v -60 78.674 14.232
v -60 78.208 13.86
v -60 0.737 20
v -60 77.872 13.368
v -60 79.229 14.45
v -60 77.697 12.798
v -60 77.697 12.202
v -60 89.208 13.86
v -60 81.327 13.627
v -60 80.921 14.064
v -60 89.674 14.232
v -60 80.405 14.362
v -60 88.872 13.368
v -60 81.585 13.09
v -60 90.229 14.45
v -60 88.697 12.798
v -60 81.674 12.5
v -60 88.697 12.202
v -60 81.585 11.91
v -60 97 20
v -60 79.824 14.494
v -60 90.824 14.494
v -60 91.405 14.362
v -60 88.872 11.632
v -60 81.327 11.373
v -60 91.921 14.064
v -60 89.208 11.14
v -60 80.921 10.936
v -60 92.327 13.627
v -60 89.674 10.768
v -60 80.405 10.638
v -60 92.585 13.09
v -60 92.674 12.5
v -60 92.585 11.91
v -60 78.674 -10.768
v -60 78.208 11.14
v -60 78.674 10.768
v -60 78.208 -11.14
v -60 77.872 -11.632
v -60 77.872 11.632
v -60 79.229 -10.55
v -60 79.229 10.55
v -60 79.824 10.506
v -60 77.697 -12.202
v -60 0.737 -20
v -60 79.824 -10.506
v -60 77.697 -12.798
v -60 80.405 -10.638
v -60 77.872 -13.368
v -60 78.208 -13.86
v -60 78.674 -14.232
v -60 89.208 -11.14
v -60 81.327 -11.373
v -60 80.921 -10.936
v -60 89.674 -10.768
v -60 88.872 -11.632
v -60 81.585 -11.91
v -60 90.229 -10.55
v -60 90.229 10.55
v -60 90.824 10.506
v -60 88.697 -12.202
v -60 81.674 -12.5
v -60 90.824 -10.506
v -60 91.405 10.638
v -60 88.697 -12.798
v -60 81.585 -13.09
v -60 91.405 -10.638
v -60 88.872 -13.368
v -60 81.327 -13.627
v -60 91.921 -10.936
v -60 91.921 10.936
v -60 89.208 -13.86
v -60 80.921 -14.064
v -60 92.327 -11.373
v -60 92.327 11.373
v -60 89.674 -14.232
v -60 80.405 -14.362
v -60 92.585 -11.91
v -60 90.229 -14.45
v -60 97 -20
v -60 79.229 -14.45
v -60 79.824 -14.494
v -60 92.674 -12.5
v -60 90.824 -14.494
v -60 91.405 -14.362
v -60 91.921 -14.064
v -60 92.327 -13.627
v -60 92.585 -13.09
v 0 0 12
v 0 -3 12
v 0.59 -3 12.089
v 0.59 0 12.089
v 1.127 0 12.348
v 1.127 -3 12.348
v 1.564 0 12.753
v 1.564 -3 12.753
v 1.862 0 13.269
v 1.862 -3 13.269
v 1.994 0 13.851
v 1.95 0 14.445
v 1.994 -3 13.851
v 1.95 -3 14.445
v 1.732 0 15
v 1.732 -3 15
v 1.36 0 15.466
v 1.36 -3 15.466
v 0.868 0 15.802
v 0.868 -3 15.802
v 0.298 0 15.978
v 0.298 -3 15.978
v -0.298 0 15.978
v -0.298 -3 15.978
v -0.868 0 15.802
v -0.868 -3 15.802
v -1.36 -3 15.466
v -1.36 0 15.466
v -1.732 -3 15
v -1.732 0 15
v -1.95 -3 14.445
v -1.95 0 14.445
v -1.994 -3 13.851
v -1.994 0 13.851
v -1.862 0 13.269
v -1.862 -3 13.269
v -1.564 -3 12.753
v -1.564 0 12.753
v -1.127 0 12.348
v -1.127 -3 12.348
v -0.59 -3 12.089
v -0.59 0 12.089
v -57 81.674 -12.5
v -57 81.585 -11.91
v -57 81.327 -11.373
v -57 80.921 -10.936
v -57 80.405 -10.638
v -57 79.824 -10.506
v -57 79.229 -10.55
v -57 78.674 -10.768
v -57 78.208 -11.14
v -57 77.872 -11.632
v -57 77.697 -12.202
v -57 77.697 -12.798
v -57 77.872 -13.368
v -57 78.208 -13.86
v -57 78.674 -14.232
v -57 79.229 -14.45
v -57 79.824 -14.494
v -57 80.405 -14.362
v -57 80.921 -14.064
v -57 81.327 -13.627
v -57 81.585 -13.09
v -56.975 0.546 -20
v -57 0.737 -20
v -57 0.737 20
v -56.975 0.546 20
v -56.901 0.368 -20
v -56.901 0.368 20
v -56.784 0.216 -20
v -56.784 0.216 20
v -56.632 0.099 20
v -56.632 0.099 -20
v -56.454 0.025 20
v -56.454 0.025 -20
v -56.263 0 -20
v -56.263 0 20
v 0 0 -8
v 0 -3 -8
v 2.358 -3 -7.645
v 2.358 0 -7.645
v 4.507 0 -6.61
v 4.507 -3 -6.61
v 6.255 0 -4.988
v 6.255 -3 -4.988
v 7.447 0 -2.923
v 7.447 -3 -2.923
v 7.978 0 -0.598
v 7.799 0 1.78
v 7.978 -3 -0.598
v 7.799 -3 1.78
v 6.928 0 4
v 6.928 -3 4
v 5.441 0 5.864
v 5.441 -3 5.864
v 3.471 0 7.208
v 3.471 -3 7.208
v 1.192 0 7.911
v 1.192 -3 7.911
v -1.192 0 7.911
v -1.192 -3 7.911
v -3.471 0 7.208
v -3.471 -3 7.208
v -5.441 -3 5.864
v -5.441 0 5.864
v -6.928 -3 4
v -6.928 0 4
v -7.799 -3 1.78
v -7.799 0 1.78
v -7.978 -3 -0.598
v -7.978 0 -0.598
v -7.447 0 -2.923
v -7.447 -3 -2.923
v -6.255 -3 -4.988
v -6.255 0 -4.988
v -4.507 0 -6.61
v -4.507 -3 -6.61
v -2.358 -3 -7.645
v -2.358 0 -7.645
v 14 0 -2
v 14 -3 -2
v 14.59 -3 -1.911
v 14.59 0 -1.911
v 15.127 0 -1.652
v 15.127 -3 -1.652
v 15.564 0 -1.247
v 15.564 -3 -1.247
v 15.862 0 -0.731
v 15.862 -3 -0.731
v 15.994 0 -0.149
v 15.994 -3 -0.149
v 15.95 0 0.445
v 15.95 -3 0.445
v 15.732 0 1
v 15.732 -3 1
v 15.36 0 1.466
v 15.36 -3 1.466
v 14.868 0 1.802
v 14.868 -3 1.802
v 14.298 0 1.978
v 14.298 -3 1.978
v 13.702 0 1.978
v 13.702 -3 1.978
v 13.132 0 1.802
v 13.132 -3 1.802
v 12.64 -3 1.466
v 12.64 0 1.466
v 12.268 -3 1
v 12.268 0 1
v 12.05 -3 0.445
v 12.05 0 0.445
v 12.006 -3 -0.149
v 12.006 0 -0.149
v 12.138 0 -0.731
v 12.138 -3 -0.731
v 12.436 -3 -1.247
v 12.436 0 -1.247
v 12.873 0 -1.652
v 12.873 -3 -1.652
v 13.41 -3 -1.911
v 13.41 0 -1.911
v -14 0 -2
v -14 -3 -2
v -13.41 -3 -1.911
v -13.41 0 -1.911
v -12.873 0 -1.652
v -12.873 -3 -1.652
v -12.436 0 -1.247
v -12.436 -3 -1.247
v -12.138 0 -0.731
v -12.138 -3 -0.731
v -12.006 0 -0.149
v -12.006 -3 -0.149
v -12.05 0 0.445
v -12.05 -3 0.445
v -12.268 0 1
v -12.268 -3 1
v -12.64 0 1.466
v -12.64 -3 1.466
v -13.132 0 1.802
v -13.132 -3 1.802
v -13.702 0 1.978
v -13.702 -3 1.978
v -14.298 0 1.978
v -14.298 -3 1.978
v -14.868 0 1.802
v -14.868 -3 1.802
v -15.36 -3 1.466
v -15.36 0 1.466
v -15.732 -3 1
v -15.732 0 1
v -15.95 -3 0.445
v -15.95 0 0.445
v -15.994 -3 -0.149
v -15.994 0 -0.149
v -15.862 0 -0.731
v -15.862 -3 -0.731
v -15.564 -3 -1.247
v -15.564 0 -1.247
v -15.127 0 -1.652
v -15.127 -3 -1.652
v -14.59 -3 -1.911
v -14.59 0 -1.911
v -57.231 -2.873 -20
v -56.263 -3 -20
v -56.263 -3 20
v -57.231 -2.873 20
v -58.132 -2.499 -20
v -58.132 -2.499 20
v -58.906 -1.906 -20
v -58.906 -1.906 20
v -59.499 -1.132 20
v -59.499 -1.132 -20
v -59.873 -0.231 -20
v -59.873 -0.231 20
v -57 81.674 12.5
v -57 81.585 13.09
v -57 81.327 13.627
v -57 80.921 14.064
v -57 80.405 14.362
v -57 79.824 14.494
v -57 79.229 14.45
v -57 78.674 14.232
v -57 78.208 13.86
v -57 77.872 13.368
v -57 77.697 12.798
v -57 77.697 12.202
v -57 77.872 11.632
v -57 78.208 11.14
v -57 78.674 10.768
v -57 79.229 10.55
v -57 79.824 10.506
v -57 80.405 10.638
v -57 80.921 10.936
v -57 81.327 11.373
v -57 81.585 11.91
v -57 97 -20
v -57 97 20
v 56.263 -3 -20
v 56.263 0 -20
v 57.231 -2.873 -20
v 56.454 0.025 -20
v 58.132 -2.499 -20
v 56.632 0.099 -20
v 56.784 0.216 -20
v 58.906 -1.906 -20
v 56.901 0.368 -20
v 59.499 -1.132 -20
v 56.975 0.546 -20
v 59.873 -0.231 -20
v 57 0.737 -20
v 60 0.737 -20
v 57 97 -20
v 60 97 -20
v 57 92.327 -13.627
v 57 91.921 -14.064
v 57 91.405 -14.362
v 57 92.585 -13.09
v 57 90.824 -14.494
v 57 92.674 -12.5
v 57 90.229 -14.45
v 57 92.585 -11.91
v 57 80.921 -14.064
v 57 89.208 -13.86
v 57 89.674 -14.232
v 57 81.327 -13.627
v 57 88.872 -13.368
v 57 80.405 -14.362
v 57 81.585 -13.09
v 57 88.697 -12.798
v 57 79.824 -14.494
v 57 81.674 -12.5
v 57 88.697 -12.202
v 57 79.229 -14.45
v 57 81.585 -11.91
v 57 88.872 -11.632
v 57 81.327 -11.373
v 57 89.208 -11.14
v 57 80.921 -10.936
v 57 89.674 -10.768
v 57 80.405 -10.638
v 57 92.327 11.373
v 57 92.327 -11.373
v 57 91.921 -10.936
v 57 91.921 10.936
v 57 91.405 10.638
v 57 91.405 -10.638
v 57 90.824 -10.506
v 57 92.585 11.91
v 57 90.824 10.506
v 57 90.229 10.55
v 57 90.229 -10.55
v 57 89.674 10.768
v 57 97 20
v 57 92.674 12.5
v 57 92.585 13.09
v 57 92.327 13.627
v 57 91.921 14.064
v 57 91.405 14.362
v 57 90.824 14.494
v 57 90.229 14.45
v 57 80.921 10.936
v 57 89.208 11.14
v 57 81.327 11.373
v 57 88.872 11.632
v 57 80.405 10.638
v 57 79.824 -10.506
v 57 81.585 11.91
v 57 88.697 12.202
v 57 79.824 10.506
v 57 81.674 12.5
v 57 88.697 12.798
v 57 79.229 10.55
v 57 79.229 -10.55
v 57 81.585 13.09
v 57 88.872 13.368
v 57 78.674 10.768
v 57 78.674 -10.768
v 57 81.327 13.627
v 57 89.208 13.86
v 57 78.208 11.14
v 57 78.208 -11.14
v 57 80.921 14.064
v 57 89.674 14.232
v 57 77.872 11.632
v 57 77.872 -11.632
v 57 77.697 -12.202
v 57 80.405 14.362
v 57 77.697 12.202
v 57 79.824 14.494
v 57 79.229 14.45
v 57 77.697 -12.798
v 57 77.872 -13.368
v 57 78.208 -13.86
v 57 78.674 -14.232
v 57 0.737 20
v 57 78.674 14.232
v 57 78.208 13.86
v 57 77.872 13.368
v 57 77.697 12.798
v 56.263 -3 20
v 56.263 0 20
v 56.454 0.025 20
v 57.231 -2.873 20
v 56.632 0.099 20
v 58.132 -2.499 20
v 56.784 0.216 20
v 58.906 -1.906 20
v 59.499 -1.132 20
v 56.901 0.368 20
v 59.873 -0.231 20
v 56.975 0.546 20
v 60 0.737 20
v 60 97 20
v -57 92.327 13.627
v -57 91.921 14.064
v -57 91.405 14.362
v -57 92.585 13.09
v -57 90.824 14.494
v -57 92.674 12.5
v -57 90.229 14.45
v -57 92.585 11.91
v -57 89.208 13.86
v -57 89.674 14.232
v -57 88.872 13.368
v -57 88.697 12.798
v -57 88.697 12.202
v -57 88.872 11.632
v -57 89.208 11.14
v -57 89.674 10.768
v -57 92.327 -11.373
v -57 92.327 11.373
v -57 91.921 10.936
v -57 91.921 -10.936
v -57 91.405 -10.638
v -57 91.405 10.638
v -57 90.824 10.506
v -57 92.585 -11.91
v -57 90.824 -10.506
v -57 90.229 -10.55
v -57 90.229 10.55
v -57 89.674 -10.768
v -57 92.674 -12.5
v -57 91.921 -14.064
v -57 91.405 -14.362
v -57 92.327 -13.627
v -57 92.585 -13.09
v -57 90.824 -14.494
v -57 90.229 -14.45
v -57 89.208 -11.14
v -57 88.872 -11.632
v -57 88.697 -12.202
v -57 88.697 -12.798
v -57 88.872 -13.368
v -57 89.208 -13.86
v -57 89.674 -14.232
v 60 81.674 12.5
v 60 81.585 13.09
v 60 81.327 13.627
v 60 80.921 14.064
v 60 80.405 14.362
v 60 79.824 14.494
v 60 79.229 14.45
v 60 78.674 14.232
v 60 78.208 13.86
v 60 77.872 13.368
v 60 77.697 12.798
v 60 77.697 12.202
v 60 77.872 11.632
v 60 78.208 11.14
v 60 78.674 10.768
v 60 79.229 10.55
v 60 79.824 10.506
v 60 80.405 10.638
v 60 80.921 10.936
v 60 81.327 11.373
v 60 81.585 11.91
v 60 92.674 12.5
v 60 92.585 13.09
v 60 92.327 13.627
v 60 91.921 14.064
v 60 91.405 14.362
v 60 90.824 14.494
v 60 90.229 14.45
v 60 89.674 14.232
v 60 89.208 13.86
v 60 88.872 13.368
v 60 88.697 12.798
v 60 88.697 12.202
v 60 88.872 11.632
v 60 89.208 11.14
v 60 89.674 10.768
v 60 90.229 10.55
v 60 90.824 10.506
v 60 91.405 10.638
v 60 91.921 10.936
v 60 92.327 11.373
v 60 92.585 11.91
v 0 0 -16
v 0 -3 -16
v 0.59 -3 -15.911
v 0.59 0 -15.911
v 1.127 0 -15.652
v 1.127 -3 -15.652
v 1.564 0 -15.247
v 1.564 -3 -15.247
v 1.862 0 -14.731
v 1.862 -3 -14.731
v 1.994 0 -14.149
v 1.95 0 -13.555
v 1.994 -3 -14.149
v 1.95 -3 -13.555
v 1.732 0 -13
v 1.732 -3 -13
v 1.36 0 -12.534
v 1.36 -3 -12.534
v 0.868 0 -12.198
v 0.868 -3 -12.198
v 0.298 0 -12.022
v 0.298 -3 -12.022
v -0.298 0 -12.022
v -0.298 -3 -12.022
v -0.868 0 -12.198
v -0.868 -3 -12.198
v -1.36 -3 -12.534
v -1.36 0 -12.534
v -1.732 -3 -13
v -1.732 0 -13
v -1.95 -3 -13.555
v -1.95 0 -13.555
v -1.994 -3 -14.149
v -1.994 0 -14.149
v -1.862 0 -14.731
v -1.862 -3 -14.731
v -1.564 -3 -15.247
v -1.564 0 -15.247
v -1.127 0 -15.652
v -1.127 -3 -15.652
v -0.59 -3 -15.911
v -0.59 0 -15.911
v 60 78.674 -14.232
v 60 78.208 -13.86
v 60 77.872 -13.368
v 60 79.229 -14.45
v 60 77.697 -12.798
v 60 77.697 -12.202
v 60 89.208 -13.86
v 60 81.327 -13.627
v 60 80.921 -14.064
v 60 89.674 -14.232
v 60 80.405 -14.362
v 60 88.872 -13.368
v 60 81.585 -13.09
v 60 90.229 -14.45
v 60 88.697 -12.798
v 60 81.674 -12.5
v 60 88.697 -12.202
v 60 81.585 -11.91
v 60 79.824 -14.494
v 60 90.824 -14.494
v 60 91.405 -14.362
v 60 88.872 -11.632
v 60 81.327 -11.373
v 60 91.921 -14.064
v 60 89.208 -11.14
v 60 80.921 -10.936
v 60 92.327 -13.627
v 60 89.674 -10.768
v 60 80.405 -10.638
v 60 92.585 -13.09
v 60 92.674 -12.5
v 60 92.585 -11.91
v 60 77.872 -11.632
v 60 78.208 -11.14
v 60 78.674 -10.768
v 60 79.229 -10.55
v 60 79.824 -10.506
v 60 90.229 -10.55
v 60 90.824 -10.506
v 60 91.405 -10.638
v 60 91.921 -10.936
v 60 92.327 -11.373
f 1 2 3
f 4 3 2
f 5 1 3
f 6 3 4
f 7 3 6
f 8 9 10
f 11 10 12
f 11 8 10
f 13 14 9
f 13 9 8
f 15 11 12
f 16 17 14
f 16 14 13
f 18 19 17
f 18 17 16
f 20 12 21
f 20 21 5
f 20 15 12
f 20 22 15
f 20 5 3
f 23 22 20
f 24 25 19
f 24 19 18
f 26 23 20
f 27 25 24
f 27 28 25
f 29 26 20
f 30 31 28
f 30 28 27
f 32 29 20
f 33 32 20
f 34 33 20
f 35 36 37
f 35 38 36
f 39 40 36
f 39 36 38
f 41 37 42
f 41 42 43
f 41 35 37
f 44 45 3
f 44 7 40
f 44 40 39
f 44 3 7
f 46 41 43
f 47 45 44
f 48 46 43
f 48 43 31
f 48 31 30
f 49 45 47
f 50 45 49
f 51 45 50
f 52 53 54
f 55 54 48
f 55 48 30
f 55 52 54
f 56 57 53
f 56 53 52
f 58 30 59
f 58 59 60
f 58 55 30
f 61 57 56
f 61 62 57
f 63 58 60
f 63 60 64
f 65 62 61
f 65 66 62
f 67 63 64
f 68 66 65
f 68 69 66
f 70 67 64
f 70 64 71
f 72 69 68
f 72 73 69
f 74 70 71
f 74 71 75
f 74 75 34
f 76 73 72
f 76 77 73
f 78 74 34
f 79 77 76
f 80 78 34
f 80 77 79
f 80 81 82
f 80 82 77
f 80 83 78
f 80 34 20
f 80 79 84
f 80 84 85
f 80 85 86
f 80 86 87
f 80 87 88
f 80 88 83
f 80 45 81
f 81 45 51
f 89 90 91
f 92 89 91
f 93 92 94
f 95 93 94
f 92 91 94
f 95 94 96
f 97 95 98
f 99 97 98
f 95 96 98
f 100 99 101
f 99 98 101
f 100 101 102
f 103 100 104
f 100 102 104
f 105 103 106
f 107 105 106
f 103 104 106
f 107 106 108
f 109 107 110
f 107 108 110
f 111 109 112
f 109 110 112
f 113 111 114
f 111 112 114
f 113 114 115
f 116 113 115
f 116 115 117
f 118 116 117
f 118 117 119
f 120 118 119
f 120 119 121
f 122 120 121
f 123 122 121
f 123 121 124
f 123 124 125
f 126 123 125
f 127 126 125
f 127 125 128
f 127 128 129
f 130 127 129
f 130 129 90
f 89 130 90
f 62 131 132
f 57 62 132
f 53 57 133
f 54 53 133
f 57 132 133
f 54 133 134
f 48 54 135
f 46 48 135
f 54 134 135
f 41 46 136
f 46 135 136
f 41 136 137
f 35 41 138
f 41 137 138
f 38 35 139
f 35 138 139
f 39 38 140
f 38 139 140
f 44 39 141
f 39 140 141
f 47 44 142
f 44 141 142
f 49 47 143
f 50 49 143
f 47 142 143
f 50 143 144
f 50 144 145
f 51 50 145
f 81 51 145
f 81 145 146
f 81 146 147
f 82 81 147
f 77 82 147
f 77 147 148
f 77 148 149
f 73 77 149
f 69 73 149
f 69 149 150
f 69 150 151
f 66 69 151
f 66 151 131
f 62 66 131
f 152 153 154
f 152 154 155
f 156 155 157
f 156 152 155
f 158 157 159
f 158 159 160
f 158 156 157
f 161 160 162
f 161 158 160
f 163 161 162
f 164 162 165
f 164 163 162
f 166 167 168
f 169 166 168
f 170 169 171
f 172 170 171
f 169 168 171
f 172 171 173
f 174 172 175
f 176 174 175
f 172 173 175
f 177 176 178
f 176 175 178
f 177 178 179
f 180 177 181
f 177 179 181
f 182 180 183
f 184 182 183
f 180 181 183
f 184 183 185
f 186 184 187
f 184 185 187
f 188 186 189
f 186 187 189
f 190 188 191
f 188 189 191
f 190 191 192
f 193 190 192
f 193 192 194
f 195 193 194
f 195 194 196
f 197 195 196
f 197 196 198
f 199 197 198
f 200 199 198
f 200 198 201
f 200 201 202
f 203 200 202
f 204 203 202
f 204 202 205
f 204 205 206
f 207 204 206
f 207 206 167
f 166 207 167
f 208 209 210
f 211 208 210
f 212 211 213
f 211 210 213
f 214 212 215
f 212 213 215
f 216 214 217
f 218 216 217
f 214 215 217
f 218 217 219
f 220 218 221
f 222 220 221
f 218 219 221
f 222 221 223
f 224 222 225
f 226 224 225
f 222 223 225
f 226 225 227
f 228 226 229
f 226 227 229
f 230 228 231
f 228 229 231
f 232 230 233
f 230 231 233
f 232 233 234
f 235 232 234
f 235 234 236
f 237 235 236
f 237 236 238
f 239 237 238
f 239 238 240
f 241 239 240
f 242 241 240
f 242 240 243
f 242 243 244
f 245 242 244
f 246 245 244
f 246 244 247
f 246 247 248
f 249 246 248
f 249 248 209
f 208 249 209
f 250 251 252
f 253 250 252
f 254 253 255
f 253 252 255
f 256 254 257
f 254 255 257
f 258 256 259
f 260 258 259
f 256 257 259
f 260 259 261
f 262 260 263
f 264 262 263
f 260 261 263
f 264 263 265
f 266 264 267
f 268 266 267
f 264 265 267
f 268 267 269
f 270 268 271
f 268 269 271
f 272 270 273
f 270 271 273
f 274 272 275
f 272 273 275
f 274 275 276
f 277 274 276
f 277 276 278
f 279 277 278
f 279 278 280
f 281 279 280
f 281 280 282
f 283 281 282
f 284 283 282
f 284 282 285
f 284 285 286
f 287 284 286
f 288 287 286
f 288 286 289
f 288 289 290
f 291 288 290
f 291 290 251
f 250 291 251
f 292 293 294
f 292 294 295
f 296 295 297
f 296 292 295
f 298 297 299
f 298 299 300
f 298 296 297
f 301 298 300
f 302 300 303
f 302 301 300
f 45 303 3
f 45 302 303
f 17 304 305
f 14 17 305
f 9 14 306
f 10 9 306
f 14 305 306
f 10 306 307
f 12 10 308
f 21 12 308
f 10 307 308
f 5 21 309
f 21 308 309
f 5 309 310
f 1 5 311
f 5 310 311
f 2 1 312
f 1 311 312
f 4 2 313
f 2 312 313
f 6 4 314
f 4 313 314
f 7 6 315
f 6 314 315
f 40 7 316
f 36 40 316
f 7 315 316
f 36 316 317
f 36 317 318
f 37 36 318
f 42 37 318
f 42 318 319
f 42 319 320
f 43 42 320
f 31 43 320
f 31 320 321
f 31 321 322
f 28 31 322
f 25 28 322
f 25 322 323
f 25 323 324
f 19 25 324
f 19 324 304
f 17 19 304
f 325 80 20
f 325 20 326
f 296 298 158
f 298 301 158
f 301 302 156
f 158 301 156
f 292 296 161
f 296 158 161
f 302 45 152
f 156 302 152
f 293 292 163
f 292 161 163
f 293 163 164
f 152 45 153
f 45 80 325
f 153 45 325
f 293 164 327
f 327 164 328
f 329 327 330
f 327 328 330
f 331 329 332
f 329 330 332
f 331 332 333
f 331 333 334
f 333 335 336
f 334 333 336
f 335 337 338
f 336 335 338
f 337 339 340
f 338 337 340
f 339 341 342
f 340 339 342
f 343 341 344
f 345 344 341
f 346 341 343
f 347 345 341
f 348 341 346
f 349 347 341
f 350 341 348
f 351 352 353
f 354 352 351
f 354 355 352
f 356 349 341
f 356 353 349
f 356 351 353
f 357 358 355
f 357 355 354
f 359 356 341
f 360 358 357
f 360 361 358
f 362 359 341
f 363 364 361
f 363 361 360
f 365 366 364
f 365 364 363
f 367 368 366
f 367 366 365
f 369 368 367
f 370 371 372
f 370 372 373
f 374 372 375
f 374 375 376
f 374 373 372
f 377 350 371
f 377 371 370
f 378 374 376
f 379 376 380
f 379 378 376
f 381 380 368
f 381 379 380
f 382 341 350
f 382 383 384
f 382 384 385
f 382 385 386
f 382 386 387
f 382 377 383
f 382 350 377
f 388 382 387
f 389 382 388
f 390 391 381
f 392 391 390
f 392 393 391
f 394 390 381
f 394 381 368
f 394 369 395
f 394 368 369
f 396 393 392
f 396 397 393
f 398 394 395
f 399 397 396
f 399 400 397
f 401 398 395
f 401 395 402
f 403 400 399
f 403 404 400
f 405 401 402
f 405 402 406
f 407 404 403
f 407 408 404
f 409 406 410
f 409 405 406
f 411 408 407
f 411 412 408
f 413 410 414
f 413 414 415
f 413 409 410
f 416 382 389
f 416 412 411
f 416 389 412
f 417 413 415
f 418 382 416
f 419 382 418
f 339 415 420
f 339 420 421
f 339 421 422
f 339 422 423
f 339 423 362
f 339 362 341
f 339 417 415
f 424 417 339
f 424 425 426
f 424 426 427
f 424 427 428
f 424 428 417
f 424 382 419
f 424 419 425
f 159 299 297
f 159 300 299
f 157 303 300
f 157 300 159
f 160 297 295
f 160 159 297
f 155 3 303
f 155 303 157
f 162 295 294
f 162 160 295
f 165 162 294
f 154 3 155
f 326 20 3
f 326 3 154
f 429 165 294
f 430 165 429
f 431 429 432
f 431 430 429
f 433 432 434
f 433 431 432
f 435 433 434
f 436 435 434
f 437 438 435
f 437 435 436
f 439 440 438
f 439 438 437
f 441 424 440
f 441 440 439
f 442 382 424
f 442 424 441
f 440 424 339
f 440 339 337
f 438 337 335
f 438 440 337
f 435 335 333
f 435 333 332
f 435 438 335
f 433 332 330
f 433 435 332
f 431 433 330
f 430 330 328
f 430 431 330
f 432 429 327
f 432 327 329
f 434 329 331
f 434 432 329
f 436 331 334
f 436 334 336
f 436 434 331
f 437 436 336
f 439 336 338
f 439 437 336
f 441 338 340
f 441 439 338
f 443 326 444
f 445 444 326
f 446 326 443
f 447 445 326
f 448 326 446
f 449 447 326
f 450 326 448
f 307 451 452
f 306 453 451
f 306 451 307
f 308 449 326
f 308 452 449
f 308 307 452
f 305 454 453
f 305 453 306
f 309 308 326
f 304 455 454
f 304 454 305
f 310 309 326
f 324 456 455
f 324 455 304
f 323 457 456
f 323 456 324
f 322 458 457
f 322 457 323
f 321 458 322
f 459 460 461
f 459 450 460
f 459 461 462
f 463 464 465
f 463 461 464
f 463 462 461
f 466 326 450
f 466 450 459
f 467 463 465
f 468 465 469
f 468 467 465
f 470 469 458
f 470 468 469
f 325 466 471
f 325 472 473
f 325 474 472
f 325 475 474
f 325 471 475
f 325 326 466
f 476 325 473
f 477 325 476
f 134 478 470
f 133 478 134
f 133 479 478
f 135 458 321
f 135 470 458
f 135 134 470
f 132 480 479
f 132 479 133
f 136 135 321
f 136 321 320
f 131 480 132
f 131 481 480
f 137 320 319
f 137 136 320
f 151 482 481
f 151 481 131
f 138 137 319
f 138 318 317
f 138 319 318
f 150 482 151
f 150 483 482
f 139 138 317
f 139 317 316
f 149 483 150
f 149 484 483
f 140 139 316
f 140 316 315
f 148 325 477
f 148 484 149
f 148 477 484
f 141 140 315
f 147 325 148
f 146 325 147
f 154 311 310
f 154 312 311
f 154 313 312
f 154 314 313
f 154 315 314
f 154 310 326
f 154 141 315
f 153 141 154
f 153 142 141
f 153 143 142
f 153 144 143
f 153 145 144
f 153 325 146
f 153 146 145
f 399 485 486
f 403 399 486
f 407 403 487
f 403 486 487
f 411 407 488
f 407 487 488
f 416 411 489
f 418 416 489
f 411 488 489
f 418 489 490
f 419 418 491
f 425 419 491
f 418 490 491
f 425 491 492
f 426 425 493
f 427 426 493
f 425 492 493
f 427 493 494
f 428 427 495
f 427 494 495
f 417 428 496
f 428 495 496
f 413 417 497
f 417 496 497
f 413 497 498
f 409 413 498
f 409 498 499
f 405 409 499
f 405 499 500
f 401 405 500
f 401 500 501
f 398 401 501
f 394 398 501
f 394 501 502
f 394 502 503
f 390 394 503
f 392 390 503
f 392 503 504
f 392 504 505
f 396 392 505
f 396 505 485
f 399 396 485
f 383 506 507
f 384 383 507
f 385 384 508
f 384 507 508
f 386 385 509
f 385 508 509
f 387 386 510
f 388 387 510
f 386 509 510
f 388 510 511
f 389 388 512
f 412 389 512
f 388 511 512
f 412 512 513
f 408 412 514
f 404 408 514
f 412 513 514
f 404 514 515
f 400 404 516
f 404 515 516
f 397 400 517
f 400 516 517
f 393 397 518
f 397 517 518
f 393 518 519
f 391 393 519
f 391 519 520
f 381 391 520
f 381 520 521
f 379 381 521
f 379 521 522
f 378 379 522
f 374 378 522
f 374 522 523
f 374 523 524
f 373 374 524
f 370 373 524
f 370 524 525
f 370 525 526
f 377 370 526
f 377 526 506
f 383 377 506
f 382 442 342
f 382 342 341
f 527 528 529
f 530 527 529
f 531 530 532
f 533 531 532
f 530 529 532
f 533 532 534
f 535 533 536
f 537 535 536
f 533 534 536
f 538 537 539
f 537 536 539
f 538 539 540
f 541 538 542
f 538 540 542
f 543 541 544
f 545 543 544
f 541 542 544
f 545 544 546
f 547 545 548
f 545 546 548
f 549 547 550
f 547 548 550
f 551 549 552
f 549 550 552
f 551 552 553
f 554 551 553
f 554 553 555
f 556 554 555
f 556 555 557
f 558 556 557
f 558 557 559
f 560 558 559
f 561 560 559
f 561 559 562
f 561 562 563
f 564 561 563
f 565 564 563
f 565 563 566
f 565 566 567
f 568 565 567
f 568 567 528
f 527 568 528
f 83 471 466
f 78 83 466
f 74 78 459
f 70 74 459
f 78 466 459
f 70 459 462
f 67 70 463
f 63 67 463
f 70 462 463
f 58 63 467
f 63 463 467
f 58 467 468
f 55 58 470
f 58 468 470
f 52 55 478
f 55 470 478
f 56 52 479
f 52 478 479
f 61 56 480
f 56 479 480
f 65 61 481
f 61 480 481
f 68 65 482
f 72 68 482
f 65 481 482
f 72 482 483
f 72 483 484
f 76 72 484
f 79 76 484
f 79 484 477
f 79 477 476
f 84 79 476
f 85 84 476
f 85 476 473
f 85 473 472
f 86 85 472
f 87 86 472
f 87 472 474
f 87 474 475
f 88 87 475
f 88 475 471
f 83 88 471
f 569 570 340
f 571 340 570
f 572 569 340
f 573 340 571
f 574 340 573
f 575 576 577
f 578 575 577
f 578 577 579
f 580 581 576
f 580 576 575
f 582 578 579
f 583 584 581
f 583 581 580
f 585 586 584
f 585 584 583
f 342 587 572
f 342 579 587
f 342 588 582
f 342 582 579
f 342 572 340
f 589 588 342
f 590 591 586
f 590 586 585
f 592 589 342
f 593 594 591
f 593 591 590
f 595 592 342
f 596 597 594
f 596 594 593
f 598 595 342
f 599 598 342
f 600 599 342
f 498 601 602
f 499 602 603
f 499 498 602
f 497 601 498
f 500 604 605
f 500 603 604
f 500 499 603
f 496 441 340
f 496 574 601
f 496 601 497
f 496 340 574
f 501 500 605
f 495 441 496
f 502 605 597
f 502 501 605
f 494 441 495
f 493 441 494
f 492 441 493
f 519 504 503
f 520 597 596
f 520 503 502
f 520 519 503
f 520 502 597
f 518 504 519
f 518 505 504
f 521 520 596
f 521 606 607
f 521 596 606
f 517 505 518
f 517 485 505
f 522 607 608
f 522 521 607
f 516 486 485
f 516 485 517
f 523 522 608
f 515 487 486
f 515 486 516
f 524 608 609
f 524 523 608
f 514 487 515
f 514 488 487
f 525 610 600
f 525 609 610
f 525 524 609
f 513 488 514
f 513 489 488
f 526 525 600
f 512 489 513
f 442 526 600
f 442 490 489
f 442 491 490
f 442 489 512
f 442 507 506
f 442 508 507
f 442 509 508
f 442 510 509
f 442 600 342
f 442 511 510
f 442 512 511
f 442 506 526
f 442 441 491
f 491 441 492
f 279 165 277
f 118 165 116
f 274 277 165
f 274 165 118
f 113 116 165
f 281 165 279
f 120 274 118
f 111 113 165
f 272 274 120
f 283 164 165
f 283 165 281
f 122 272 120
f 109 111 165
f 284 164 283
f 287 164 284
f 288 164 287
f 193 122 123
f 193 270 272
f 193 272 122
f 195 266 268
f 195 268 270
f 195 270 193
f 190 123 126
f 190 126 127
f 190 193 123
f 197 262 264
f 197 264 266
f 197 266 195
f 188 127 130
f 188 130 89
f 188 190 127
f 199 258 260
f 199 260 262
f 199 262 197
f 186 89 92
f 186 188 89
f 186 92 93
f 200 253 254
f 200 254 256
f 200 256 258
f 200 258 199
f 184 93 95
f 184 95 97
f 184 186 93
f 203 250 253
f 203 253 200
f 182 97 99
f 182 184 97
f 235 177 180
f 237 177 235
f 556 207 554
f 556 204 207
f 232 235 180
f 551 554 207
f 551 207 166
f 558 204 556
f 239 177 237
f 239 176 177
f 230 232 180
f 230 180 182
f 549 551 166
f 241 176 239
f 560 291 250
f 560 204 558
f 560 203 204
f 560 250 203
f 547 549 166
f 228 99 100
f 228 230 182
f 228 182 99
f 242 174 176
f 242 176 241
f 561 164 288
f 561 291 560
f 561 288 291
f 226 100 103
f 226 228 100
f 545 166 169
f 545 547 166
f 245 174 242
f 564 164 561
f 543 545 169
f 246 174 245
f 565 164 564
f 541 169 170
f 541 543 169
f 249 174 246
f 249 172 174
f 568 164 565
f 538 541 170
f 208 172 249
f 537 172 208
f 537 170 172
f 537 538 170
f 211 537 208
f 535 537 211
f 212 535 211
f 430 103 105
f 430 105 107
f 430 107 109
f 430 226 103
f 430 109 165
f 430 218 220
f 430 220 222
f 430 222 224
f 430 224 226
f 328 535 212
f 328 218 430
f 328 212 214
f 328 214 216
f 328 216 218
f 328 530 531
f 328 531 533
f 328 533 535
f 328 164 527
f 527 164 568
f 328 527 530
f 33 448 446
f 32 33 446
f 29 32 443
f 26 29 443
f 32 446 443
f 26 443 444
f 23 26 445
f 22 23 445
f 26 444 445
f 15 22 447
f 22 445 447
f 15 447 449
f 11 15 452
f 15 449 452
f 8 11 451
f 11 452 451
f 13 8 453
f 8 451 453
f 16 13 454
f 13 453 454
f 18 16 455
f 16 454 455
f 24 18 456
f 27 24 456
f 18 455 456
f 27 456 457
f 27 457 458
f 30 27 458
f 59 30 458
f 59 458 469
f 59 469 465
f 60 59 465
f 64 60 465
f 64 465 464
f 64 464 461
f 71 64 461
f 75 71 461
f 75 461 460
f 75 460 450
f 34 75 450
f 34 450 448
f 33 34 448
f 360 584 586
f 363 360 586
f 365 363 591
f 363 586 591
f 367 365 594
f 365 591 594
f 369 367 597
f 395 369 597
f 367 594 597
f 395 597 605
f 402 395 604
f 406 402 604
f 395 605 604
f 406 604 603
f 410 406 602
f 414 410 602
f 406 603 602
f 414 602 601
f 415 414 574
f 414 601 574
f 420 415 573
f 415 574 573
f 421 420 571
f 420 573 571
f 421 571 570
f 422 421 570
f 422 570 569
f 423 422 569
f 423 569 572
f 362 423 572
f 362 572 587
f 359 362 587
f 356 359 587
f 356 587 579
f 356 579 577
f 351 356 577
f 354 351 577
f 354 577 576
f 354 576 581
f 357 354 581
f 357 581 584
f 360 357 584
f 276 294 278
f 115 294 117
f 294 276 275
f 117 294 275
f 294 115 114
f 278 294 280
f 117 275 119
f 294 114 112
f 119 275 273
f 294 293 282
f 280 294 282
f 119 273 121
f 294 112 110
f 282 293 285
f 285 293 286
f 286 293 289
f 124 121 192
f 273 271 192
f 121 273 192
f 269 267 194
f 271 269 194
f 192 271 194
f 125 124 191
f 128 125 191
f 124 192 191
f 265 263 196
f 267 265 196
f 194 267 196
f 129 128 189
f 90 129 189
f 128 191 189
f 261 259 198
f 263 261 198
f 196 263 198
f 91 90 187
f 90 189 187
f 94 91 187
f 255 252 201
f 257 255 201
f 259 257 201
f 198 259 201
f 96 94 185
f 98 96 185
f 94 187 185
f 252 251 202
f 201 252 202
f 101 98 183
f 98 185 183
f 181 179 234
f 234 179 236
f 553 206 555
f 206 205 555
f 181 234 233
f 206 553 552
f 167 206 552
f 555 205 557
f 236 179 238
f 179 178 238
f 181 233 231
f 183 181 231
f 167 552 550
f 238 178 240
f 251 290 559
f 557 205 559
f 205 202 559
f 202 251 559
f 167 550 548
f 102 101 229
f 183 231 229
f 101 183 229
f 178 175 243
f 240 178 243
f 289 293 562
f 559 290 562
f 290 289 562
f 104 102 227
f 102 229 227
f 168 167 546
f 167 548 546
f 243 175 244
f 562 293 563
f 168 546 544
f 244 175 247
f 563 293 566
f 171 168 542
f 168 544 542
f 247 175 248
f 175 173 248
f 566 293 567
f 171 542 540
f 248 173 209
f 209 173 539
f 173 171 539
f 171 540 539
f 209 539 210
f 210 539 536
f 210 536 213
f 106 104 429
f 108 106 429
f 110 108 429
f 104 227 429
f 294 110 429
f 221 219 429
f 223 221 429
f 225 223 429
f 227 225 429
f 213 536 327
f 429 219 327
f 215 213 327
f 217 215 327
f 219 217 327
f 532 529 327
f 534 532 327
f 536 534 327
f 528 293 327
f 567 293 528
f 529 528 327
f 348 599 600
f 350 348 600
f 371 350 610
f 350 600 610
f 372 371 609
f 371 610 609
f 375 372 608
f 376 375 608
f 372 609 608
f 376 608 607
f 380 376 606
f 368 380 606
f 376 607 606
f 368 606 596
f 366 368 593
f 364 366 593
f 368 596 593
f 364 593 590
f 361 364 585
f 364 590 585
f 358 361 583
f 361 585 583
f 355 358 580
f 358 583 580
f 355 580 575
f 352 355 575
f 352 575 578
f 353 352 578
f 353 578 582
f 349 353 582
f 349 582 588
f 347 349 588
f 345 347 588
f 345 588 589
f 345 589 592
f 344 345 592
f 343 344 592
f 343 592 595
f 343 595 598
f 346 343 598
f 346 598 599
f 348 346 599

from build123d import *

# Parameters (mm, degrees)
SKETCH3_W                    = 114
SKETCH3_H                    = 40
BASE_FLANGE1_DEPTH           = 3
EDGE_FLANGE1_STRIP_W         = 13.4732
EDGE_FLANGE1_STRIP_H         = 3
EDGE_FLANGE1_STRIP_CUT_DEPTH = 40
EDGE_FLANGE1_DEPTH           = 40
EDGE_FLANGE2_STRIP_W         = 13.4732
EDGE_FLANGE2_STRIP_H         = 3
EDGE_FLANGE2_STRIP_CUT_DEPTH = 40
EDGE_FLANGE2_DEPTH           = 40
SKETCH11_R                   = 8
SKETCH11_R_2                 = 2
CUT_EXTRUDE1_DEPTH           = 10
CUT_EXTRUDE2_REACH           = 157.592
SKETCH12_R                   = 2


# Sheet-metal steps are written as plain solids
with BuildPart() as part:
    # Sketch3 → Base-Flange1 (new body)
    with BuildSketch(Plane(origin=(0, 0, 0), x_dir=(1, 0, 0), z_dir=(0, 1, 0))):
        Rectangle(SKETCH3_W, SKETCH3_H)
    extrude(amount=-BASE_FLANGE1_DEPTH)

    # Edge-Flange1 strip (across the edge) → Edge-Flange1 strip cut (cut)
    with BuildSketch(Plane(origin=(-57, 0, -20), x_dir=(1, 0, 0), z_dir=(0, 0, 1))):
        with Locations((-6, -1.5)):
            Rectangle(EDGE_FLANGE1_STRIP_W, EDGE_FLANGE1_STRIP_H)
    extrude(amount=EDGE_FLANGE1_STRIP_CUT_DEPTH, mode=Mode.SUBTRACT)

    # Edge-Flange1 section (across the edge) → Edge-Flange1 (add)
    with BuildSketch(Plane(origin=(-57, 0, -20), x_dir=(1, 0, 0), z_dir=(0, 0, 1))):
        with BuildLine():
            Line((-3, 0.7366), (-3, 97))
            Line((-3, 97), (0, 97))
            Line((0, 97), (0, 0.7366))
            ThreePointArc((0, 0.7366), (0.215745145, 0.215745145), (0.7366, 0))
            Line((0.7366, 0), (0.7366, -3))
            ThreePointArc((0.7366, -3), (-1.905575199, -1.905575199), (-3, 0.7366))
        make_face()
    extrude(amount=EDGE_FLANGE1_DEPTH)

    # Edge-Flange2 strip (across the edge) → Edge-Flange2 strip cut (cut)
    with BuildSketch(Plane(origin=(57, 0, 20), x_dir=(-1, 0, 0), z_dir=(0, 0, -1))):
        with Locations((-6, -1.5)):
            Rectangle(EDGE_FLANGE2_STRIP_W, EDGE_FLANGE2_STRIP_H)
    extrude(amount=EDGE_FLANGE2_STRIP_CUT_DEPTH, mode=Mode.SUBTRACT)

    # Edge-Flange2 section (across the edge) → Edge-Flange2 (add)
    with BuildSketch(Plane(origin=(57, 0, 20), x_dir=(-1, 0, 0), z_dir=(0, 0, -1))):
        with BuildLine():
            Line((-3, 0.7366), (-3, 97))
            Line((-3, 97), (0, 97))
            Line((0, 97), (0, 0.7366))
            ThreePointArc((0, 0.7366), (0.215745145, 0.215745145), (0.7366, 0))
            Line((0.7366, 0), (0.7366, -3))
            ThreePointArc((0.7366, -3), (-1.905575199, -1.905575199), (-3, 0.7366))
        make_face()
    extrude(amount=EDGE_FLANGE2_DEPTH)

    # Sketch11 → Cut-Extrude1 (cut)
    with BuildSketch(Plane(origin=(0, -3, 0), x_dir=(-1, 0, 0), z_dir=(0, -1, 0))):
        with Locations(Location((0, 0, 0), (0, 0, 90))):
            Circle(SKETCH11_R)
        with Locations(Location((0, 14, 0), (0, 0, 90))):
            Circle(SKETCH11_R_2)
        with Locations(Location((14, 0, 0), (0, 0, 90))):
            Circle(SKETCH11_R_2)
        with Locations(Location((0, -14, 0), (0, 0, 90))):
            Circle(SKETCH11_R_2)
        with Locations(Location((-14, 0, 0), (0, 0, 90))):
            Circle(SKETCH11_R_2)
    extrude(amount=-CUT_EXTRUDE1_DEPTH, mode=Mode.SUBTRACT)

    # Cut-Extrude2: up to this face of the body (flat: up to its plane)
    cut_extrude2_end = Plane(part.part.faces().sort_by_distance((-60, 48.8683, 0))[0])
    # Sketch12 → Cut-Extrude2 (cut, up to the picked face)
    with BuildSketch(Plane(origin=(60, 0, 0), x_dir=(0, 0, -1), z_dir=(1, 0, 0)), mode=Mode.PRIVATE) as cut_extrude2_sk1:
        with Locations(Location((12.5, 79.674243403, 0), (0, 0, 90))):
            Circle(SKETCH12_R)
    cut_extrude2_tool1 = split(extrude(cut_extrude2_sk1.sketch, amount=-CUT_EXTRUDE2_REACH, mode=Mode.PRIVATE), bisect_by=cut_extrude2_end, keep=Keep.BOTH, mode=Mode.PRIVATE)
    # Sketch12 → Cut-Extrude2 (cut, up to the picked face)
    with BuildSketch(Plane(origin=(60, 0, 0), x_dir=(0, 0, -1), z_dir=(1, 0, 0)), mode=Mode.PRIVATE) as cut_extrude2_sk2:
        with Locations(Location((12.5, 90.674243403, 0), (0, 0, 90))):
            Circle(SKETCH12_R)
    cut_extrude2_tool2 = split(extrude(cut_extrude2_sk2.sketch, amount=-CUT_EXTRUDE2_REACH, mode=Mode.PRIVATE), bisect_by=cut_extrude2_end, keep=Keep.BOTH, mode=Mode.PRIVATE)
    # Sketch12 → Cut-Extrude2 (cut, up to the picked face)
    with BuildSketch(Plane(origin=(60, 0, 0), x_dir=(0, 0, -1), z_dir=(1, 0, 0)), mode=Mode.PRIVATE) as cut_extrude2_sk3:
        with Locations(Location((-12.5, 79.674243403, 0), (0, 0, 90))):
            Circle(SKETCH12_R)
    cut_extrude2_tool3 = split(extrude(cut_extrude2_sk3.sketch, amount=-CUT_EXTRUDE2_REACH, mode=Mode.PRIVATE), bisect_by=cut_extrude2_end, keep=Keep.BOTH, mode=Mode.PRIVATE)
    # Sketch12 → Cut-Extrude2 (cut, up to the picked face)
    with BuildSketch(Plane(origin=(60, 0, 0), x_dir=(0, 0, -1), z_dir=(1, 0, 0)), mode=Mode.PRIVATE) as cut_extrude2_sk4:
        with Locations(Location((-12.5, 90.674243403, 0), (0, 0, 90))):
            Circle(SKETCH12_R)
    cut_extrude2_tool4 = split(extrude(cut_extrude2_sk4.sketch, amount=-CUT_EXTRUDE2_REACH, mode=Mode.PRIVATE), bisect_by=cut_extrude2_end, keep=Keep.BOTH, mode=Mode.PRIVATE)
    add(cut_extrude2_tool1.solids().sort_by(Axis((60, 79.674243, -12.5), (-1, 0, 0)))[0], mode=Mode.SUBTRACT)
    add(cut_extrude2_tool2.solids().sort_by(Axis((60, 90.674243, -12.5), (-1, 0, 0)))[0], mode=Mode.SUBTRACT)
    add(cut_extrude2_tool3.solids().sort_by(Axis((60, 79.674243, 12.5), (-1, 0, 0)))[0], mode=Mode.SUBTRACT)
    add(cut_extrude2_tool4.solids().sort_by(Axis((60, 90.674243, 12.5), (-1, 0, 0)))[0], mode=Mode.SUBTRACT)


solid = part.part
